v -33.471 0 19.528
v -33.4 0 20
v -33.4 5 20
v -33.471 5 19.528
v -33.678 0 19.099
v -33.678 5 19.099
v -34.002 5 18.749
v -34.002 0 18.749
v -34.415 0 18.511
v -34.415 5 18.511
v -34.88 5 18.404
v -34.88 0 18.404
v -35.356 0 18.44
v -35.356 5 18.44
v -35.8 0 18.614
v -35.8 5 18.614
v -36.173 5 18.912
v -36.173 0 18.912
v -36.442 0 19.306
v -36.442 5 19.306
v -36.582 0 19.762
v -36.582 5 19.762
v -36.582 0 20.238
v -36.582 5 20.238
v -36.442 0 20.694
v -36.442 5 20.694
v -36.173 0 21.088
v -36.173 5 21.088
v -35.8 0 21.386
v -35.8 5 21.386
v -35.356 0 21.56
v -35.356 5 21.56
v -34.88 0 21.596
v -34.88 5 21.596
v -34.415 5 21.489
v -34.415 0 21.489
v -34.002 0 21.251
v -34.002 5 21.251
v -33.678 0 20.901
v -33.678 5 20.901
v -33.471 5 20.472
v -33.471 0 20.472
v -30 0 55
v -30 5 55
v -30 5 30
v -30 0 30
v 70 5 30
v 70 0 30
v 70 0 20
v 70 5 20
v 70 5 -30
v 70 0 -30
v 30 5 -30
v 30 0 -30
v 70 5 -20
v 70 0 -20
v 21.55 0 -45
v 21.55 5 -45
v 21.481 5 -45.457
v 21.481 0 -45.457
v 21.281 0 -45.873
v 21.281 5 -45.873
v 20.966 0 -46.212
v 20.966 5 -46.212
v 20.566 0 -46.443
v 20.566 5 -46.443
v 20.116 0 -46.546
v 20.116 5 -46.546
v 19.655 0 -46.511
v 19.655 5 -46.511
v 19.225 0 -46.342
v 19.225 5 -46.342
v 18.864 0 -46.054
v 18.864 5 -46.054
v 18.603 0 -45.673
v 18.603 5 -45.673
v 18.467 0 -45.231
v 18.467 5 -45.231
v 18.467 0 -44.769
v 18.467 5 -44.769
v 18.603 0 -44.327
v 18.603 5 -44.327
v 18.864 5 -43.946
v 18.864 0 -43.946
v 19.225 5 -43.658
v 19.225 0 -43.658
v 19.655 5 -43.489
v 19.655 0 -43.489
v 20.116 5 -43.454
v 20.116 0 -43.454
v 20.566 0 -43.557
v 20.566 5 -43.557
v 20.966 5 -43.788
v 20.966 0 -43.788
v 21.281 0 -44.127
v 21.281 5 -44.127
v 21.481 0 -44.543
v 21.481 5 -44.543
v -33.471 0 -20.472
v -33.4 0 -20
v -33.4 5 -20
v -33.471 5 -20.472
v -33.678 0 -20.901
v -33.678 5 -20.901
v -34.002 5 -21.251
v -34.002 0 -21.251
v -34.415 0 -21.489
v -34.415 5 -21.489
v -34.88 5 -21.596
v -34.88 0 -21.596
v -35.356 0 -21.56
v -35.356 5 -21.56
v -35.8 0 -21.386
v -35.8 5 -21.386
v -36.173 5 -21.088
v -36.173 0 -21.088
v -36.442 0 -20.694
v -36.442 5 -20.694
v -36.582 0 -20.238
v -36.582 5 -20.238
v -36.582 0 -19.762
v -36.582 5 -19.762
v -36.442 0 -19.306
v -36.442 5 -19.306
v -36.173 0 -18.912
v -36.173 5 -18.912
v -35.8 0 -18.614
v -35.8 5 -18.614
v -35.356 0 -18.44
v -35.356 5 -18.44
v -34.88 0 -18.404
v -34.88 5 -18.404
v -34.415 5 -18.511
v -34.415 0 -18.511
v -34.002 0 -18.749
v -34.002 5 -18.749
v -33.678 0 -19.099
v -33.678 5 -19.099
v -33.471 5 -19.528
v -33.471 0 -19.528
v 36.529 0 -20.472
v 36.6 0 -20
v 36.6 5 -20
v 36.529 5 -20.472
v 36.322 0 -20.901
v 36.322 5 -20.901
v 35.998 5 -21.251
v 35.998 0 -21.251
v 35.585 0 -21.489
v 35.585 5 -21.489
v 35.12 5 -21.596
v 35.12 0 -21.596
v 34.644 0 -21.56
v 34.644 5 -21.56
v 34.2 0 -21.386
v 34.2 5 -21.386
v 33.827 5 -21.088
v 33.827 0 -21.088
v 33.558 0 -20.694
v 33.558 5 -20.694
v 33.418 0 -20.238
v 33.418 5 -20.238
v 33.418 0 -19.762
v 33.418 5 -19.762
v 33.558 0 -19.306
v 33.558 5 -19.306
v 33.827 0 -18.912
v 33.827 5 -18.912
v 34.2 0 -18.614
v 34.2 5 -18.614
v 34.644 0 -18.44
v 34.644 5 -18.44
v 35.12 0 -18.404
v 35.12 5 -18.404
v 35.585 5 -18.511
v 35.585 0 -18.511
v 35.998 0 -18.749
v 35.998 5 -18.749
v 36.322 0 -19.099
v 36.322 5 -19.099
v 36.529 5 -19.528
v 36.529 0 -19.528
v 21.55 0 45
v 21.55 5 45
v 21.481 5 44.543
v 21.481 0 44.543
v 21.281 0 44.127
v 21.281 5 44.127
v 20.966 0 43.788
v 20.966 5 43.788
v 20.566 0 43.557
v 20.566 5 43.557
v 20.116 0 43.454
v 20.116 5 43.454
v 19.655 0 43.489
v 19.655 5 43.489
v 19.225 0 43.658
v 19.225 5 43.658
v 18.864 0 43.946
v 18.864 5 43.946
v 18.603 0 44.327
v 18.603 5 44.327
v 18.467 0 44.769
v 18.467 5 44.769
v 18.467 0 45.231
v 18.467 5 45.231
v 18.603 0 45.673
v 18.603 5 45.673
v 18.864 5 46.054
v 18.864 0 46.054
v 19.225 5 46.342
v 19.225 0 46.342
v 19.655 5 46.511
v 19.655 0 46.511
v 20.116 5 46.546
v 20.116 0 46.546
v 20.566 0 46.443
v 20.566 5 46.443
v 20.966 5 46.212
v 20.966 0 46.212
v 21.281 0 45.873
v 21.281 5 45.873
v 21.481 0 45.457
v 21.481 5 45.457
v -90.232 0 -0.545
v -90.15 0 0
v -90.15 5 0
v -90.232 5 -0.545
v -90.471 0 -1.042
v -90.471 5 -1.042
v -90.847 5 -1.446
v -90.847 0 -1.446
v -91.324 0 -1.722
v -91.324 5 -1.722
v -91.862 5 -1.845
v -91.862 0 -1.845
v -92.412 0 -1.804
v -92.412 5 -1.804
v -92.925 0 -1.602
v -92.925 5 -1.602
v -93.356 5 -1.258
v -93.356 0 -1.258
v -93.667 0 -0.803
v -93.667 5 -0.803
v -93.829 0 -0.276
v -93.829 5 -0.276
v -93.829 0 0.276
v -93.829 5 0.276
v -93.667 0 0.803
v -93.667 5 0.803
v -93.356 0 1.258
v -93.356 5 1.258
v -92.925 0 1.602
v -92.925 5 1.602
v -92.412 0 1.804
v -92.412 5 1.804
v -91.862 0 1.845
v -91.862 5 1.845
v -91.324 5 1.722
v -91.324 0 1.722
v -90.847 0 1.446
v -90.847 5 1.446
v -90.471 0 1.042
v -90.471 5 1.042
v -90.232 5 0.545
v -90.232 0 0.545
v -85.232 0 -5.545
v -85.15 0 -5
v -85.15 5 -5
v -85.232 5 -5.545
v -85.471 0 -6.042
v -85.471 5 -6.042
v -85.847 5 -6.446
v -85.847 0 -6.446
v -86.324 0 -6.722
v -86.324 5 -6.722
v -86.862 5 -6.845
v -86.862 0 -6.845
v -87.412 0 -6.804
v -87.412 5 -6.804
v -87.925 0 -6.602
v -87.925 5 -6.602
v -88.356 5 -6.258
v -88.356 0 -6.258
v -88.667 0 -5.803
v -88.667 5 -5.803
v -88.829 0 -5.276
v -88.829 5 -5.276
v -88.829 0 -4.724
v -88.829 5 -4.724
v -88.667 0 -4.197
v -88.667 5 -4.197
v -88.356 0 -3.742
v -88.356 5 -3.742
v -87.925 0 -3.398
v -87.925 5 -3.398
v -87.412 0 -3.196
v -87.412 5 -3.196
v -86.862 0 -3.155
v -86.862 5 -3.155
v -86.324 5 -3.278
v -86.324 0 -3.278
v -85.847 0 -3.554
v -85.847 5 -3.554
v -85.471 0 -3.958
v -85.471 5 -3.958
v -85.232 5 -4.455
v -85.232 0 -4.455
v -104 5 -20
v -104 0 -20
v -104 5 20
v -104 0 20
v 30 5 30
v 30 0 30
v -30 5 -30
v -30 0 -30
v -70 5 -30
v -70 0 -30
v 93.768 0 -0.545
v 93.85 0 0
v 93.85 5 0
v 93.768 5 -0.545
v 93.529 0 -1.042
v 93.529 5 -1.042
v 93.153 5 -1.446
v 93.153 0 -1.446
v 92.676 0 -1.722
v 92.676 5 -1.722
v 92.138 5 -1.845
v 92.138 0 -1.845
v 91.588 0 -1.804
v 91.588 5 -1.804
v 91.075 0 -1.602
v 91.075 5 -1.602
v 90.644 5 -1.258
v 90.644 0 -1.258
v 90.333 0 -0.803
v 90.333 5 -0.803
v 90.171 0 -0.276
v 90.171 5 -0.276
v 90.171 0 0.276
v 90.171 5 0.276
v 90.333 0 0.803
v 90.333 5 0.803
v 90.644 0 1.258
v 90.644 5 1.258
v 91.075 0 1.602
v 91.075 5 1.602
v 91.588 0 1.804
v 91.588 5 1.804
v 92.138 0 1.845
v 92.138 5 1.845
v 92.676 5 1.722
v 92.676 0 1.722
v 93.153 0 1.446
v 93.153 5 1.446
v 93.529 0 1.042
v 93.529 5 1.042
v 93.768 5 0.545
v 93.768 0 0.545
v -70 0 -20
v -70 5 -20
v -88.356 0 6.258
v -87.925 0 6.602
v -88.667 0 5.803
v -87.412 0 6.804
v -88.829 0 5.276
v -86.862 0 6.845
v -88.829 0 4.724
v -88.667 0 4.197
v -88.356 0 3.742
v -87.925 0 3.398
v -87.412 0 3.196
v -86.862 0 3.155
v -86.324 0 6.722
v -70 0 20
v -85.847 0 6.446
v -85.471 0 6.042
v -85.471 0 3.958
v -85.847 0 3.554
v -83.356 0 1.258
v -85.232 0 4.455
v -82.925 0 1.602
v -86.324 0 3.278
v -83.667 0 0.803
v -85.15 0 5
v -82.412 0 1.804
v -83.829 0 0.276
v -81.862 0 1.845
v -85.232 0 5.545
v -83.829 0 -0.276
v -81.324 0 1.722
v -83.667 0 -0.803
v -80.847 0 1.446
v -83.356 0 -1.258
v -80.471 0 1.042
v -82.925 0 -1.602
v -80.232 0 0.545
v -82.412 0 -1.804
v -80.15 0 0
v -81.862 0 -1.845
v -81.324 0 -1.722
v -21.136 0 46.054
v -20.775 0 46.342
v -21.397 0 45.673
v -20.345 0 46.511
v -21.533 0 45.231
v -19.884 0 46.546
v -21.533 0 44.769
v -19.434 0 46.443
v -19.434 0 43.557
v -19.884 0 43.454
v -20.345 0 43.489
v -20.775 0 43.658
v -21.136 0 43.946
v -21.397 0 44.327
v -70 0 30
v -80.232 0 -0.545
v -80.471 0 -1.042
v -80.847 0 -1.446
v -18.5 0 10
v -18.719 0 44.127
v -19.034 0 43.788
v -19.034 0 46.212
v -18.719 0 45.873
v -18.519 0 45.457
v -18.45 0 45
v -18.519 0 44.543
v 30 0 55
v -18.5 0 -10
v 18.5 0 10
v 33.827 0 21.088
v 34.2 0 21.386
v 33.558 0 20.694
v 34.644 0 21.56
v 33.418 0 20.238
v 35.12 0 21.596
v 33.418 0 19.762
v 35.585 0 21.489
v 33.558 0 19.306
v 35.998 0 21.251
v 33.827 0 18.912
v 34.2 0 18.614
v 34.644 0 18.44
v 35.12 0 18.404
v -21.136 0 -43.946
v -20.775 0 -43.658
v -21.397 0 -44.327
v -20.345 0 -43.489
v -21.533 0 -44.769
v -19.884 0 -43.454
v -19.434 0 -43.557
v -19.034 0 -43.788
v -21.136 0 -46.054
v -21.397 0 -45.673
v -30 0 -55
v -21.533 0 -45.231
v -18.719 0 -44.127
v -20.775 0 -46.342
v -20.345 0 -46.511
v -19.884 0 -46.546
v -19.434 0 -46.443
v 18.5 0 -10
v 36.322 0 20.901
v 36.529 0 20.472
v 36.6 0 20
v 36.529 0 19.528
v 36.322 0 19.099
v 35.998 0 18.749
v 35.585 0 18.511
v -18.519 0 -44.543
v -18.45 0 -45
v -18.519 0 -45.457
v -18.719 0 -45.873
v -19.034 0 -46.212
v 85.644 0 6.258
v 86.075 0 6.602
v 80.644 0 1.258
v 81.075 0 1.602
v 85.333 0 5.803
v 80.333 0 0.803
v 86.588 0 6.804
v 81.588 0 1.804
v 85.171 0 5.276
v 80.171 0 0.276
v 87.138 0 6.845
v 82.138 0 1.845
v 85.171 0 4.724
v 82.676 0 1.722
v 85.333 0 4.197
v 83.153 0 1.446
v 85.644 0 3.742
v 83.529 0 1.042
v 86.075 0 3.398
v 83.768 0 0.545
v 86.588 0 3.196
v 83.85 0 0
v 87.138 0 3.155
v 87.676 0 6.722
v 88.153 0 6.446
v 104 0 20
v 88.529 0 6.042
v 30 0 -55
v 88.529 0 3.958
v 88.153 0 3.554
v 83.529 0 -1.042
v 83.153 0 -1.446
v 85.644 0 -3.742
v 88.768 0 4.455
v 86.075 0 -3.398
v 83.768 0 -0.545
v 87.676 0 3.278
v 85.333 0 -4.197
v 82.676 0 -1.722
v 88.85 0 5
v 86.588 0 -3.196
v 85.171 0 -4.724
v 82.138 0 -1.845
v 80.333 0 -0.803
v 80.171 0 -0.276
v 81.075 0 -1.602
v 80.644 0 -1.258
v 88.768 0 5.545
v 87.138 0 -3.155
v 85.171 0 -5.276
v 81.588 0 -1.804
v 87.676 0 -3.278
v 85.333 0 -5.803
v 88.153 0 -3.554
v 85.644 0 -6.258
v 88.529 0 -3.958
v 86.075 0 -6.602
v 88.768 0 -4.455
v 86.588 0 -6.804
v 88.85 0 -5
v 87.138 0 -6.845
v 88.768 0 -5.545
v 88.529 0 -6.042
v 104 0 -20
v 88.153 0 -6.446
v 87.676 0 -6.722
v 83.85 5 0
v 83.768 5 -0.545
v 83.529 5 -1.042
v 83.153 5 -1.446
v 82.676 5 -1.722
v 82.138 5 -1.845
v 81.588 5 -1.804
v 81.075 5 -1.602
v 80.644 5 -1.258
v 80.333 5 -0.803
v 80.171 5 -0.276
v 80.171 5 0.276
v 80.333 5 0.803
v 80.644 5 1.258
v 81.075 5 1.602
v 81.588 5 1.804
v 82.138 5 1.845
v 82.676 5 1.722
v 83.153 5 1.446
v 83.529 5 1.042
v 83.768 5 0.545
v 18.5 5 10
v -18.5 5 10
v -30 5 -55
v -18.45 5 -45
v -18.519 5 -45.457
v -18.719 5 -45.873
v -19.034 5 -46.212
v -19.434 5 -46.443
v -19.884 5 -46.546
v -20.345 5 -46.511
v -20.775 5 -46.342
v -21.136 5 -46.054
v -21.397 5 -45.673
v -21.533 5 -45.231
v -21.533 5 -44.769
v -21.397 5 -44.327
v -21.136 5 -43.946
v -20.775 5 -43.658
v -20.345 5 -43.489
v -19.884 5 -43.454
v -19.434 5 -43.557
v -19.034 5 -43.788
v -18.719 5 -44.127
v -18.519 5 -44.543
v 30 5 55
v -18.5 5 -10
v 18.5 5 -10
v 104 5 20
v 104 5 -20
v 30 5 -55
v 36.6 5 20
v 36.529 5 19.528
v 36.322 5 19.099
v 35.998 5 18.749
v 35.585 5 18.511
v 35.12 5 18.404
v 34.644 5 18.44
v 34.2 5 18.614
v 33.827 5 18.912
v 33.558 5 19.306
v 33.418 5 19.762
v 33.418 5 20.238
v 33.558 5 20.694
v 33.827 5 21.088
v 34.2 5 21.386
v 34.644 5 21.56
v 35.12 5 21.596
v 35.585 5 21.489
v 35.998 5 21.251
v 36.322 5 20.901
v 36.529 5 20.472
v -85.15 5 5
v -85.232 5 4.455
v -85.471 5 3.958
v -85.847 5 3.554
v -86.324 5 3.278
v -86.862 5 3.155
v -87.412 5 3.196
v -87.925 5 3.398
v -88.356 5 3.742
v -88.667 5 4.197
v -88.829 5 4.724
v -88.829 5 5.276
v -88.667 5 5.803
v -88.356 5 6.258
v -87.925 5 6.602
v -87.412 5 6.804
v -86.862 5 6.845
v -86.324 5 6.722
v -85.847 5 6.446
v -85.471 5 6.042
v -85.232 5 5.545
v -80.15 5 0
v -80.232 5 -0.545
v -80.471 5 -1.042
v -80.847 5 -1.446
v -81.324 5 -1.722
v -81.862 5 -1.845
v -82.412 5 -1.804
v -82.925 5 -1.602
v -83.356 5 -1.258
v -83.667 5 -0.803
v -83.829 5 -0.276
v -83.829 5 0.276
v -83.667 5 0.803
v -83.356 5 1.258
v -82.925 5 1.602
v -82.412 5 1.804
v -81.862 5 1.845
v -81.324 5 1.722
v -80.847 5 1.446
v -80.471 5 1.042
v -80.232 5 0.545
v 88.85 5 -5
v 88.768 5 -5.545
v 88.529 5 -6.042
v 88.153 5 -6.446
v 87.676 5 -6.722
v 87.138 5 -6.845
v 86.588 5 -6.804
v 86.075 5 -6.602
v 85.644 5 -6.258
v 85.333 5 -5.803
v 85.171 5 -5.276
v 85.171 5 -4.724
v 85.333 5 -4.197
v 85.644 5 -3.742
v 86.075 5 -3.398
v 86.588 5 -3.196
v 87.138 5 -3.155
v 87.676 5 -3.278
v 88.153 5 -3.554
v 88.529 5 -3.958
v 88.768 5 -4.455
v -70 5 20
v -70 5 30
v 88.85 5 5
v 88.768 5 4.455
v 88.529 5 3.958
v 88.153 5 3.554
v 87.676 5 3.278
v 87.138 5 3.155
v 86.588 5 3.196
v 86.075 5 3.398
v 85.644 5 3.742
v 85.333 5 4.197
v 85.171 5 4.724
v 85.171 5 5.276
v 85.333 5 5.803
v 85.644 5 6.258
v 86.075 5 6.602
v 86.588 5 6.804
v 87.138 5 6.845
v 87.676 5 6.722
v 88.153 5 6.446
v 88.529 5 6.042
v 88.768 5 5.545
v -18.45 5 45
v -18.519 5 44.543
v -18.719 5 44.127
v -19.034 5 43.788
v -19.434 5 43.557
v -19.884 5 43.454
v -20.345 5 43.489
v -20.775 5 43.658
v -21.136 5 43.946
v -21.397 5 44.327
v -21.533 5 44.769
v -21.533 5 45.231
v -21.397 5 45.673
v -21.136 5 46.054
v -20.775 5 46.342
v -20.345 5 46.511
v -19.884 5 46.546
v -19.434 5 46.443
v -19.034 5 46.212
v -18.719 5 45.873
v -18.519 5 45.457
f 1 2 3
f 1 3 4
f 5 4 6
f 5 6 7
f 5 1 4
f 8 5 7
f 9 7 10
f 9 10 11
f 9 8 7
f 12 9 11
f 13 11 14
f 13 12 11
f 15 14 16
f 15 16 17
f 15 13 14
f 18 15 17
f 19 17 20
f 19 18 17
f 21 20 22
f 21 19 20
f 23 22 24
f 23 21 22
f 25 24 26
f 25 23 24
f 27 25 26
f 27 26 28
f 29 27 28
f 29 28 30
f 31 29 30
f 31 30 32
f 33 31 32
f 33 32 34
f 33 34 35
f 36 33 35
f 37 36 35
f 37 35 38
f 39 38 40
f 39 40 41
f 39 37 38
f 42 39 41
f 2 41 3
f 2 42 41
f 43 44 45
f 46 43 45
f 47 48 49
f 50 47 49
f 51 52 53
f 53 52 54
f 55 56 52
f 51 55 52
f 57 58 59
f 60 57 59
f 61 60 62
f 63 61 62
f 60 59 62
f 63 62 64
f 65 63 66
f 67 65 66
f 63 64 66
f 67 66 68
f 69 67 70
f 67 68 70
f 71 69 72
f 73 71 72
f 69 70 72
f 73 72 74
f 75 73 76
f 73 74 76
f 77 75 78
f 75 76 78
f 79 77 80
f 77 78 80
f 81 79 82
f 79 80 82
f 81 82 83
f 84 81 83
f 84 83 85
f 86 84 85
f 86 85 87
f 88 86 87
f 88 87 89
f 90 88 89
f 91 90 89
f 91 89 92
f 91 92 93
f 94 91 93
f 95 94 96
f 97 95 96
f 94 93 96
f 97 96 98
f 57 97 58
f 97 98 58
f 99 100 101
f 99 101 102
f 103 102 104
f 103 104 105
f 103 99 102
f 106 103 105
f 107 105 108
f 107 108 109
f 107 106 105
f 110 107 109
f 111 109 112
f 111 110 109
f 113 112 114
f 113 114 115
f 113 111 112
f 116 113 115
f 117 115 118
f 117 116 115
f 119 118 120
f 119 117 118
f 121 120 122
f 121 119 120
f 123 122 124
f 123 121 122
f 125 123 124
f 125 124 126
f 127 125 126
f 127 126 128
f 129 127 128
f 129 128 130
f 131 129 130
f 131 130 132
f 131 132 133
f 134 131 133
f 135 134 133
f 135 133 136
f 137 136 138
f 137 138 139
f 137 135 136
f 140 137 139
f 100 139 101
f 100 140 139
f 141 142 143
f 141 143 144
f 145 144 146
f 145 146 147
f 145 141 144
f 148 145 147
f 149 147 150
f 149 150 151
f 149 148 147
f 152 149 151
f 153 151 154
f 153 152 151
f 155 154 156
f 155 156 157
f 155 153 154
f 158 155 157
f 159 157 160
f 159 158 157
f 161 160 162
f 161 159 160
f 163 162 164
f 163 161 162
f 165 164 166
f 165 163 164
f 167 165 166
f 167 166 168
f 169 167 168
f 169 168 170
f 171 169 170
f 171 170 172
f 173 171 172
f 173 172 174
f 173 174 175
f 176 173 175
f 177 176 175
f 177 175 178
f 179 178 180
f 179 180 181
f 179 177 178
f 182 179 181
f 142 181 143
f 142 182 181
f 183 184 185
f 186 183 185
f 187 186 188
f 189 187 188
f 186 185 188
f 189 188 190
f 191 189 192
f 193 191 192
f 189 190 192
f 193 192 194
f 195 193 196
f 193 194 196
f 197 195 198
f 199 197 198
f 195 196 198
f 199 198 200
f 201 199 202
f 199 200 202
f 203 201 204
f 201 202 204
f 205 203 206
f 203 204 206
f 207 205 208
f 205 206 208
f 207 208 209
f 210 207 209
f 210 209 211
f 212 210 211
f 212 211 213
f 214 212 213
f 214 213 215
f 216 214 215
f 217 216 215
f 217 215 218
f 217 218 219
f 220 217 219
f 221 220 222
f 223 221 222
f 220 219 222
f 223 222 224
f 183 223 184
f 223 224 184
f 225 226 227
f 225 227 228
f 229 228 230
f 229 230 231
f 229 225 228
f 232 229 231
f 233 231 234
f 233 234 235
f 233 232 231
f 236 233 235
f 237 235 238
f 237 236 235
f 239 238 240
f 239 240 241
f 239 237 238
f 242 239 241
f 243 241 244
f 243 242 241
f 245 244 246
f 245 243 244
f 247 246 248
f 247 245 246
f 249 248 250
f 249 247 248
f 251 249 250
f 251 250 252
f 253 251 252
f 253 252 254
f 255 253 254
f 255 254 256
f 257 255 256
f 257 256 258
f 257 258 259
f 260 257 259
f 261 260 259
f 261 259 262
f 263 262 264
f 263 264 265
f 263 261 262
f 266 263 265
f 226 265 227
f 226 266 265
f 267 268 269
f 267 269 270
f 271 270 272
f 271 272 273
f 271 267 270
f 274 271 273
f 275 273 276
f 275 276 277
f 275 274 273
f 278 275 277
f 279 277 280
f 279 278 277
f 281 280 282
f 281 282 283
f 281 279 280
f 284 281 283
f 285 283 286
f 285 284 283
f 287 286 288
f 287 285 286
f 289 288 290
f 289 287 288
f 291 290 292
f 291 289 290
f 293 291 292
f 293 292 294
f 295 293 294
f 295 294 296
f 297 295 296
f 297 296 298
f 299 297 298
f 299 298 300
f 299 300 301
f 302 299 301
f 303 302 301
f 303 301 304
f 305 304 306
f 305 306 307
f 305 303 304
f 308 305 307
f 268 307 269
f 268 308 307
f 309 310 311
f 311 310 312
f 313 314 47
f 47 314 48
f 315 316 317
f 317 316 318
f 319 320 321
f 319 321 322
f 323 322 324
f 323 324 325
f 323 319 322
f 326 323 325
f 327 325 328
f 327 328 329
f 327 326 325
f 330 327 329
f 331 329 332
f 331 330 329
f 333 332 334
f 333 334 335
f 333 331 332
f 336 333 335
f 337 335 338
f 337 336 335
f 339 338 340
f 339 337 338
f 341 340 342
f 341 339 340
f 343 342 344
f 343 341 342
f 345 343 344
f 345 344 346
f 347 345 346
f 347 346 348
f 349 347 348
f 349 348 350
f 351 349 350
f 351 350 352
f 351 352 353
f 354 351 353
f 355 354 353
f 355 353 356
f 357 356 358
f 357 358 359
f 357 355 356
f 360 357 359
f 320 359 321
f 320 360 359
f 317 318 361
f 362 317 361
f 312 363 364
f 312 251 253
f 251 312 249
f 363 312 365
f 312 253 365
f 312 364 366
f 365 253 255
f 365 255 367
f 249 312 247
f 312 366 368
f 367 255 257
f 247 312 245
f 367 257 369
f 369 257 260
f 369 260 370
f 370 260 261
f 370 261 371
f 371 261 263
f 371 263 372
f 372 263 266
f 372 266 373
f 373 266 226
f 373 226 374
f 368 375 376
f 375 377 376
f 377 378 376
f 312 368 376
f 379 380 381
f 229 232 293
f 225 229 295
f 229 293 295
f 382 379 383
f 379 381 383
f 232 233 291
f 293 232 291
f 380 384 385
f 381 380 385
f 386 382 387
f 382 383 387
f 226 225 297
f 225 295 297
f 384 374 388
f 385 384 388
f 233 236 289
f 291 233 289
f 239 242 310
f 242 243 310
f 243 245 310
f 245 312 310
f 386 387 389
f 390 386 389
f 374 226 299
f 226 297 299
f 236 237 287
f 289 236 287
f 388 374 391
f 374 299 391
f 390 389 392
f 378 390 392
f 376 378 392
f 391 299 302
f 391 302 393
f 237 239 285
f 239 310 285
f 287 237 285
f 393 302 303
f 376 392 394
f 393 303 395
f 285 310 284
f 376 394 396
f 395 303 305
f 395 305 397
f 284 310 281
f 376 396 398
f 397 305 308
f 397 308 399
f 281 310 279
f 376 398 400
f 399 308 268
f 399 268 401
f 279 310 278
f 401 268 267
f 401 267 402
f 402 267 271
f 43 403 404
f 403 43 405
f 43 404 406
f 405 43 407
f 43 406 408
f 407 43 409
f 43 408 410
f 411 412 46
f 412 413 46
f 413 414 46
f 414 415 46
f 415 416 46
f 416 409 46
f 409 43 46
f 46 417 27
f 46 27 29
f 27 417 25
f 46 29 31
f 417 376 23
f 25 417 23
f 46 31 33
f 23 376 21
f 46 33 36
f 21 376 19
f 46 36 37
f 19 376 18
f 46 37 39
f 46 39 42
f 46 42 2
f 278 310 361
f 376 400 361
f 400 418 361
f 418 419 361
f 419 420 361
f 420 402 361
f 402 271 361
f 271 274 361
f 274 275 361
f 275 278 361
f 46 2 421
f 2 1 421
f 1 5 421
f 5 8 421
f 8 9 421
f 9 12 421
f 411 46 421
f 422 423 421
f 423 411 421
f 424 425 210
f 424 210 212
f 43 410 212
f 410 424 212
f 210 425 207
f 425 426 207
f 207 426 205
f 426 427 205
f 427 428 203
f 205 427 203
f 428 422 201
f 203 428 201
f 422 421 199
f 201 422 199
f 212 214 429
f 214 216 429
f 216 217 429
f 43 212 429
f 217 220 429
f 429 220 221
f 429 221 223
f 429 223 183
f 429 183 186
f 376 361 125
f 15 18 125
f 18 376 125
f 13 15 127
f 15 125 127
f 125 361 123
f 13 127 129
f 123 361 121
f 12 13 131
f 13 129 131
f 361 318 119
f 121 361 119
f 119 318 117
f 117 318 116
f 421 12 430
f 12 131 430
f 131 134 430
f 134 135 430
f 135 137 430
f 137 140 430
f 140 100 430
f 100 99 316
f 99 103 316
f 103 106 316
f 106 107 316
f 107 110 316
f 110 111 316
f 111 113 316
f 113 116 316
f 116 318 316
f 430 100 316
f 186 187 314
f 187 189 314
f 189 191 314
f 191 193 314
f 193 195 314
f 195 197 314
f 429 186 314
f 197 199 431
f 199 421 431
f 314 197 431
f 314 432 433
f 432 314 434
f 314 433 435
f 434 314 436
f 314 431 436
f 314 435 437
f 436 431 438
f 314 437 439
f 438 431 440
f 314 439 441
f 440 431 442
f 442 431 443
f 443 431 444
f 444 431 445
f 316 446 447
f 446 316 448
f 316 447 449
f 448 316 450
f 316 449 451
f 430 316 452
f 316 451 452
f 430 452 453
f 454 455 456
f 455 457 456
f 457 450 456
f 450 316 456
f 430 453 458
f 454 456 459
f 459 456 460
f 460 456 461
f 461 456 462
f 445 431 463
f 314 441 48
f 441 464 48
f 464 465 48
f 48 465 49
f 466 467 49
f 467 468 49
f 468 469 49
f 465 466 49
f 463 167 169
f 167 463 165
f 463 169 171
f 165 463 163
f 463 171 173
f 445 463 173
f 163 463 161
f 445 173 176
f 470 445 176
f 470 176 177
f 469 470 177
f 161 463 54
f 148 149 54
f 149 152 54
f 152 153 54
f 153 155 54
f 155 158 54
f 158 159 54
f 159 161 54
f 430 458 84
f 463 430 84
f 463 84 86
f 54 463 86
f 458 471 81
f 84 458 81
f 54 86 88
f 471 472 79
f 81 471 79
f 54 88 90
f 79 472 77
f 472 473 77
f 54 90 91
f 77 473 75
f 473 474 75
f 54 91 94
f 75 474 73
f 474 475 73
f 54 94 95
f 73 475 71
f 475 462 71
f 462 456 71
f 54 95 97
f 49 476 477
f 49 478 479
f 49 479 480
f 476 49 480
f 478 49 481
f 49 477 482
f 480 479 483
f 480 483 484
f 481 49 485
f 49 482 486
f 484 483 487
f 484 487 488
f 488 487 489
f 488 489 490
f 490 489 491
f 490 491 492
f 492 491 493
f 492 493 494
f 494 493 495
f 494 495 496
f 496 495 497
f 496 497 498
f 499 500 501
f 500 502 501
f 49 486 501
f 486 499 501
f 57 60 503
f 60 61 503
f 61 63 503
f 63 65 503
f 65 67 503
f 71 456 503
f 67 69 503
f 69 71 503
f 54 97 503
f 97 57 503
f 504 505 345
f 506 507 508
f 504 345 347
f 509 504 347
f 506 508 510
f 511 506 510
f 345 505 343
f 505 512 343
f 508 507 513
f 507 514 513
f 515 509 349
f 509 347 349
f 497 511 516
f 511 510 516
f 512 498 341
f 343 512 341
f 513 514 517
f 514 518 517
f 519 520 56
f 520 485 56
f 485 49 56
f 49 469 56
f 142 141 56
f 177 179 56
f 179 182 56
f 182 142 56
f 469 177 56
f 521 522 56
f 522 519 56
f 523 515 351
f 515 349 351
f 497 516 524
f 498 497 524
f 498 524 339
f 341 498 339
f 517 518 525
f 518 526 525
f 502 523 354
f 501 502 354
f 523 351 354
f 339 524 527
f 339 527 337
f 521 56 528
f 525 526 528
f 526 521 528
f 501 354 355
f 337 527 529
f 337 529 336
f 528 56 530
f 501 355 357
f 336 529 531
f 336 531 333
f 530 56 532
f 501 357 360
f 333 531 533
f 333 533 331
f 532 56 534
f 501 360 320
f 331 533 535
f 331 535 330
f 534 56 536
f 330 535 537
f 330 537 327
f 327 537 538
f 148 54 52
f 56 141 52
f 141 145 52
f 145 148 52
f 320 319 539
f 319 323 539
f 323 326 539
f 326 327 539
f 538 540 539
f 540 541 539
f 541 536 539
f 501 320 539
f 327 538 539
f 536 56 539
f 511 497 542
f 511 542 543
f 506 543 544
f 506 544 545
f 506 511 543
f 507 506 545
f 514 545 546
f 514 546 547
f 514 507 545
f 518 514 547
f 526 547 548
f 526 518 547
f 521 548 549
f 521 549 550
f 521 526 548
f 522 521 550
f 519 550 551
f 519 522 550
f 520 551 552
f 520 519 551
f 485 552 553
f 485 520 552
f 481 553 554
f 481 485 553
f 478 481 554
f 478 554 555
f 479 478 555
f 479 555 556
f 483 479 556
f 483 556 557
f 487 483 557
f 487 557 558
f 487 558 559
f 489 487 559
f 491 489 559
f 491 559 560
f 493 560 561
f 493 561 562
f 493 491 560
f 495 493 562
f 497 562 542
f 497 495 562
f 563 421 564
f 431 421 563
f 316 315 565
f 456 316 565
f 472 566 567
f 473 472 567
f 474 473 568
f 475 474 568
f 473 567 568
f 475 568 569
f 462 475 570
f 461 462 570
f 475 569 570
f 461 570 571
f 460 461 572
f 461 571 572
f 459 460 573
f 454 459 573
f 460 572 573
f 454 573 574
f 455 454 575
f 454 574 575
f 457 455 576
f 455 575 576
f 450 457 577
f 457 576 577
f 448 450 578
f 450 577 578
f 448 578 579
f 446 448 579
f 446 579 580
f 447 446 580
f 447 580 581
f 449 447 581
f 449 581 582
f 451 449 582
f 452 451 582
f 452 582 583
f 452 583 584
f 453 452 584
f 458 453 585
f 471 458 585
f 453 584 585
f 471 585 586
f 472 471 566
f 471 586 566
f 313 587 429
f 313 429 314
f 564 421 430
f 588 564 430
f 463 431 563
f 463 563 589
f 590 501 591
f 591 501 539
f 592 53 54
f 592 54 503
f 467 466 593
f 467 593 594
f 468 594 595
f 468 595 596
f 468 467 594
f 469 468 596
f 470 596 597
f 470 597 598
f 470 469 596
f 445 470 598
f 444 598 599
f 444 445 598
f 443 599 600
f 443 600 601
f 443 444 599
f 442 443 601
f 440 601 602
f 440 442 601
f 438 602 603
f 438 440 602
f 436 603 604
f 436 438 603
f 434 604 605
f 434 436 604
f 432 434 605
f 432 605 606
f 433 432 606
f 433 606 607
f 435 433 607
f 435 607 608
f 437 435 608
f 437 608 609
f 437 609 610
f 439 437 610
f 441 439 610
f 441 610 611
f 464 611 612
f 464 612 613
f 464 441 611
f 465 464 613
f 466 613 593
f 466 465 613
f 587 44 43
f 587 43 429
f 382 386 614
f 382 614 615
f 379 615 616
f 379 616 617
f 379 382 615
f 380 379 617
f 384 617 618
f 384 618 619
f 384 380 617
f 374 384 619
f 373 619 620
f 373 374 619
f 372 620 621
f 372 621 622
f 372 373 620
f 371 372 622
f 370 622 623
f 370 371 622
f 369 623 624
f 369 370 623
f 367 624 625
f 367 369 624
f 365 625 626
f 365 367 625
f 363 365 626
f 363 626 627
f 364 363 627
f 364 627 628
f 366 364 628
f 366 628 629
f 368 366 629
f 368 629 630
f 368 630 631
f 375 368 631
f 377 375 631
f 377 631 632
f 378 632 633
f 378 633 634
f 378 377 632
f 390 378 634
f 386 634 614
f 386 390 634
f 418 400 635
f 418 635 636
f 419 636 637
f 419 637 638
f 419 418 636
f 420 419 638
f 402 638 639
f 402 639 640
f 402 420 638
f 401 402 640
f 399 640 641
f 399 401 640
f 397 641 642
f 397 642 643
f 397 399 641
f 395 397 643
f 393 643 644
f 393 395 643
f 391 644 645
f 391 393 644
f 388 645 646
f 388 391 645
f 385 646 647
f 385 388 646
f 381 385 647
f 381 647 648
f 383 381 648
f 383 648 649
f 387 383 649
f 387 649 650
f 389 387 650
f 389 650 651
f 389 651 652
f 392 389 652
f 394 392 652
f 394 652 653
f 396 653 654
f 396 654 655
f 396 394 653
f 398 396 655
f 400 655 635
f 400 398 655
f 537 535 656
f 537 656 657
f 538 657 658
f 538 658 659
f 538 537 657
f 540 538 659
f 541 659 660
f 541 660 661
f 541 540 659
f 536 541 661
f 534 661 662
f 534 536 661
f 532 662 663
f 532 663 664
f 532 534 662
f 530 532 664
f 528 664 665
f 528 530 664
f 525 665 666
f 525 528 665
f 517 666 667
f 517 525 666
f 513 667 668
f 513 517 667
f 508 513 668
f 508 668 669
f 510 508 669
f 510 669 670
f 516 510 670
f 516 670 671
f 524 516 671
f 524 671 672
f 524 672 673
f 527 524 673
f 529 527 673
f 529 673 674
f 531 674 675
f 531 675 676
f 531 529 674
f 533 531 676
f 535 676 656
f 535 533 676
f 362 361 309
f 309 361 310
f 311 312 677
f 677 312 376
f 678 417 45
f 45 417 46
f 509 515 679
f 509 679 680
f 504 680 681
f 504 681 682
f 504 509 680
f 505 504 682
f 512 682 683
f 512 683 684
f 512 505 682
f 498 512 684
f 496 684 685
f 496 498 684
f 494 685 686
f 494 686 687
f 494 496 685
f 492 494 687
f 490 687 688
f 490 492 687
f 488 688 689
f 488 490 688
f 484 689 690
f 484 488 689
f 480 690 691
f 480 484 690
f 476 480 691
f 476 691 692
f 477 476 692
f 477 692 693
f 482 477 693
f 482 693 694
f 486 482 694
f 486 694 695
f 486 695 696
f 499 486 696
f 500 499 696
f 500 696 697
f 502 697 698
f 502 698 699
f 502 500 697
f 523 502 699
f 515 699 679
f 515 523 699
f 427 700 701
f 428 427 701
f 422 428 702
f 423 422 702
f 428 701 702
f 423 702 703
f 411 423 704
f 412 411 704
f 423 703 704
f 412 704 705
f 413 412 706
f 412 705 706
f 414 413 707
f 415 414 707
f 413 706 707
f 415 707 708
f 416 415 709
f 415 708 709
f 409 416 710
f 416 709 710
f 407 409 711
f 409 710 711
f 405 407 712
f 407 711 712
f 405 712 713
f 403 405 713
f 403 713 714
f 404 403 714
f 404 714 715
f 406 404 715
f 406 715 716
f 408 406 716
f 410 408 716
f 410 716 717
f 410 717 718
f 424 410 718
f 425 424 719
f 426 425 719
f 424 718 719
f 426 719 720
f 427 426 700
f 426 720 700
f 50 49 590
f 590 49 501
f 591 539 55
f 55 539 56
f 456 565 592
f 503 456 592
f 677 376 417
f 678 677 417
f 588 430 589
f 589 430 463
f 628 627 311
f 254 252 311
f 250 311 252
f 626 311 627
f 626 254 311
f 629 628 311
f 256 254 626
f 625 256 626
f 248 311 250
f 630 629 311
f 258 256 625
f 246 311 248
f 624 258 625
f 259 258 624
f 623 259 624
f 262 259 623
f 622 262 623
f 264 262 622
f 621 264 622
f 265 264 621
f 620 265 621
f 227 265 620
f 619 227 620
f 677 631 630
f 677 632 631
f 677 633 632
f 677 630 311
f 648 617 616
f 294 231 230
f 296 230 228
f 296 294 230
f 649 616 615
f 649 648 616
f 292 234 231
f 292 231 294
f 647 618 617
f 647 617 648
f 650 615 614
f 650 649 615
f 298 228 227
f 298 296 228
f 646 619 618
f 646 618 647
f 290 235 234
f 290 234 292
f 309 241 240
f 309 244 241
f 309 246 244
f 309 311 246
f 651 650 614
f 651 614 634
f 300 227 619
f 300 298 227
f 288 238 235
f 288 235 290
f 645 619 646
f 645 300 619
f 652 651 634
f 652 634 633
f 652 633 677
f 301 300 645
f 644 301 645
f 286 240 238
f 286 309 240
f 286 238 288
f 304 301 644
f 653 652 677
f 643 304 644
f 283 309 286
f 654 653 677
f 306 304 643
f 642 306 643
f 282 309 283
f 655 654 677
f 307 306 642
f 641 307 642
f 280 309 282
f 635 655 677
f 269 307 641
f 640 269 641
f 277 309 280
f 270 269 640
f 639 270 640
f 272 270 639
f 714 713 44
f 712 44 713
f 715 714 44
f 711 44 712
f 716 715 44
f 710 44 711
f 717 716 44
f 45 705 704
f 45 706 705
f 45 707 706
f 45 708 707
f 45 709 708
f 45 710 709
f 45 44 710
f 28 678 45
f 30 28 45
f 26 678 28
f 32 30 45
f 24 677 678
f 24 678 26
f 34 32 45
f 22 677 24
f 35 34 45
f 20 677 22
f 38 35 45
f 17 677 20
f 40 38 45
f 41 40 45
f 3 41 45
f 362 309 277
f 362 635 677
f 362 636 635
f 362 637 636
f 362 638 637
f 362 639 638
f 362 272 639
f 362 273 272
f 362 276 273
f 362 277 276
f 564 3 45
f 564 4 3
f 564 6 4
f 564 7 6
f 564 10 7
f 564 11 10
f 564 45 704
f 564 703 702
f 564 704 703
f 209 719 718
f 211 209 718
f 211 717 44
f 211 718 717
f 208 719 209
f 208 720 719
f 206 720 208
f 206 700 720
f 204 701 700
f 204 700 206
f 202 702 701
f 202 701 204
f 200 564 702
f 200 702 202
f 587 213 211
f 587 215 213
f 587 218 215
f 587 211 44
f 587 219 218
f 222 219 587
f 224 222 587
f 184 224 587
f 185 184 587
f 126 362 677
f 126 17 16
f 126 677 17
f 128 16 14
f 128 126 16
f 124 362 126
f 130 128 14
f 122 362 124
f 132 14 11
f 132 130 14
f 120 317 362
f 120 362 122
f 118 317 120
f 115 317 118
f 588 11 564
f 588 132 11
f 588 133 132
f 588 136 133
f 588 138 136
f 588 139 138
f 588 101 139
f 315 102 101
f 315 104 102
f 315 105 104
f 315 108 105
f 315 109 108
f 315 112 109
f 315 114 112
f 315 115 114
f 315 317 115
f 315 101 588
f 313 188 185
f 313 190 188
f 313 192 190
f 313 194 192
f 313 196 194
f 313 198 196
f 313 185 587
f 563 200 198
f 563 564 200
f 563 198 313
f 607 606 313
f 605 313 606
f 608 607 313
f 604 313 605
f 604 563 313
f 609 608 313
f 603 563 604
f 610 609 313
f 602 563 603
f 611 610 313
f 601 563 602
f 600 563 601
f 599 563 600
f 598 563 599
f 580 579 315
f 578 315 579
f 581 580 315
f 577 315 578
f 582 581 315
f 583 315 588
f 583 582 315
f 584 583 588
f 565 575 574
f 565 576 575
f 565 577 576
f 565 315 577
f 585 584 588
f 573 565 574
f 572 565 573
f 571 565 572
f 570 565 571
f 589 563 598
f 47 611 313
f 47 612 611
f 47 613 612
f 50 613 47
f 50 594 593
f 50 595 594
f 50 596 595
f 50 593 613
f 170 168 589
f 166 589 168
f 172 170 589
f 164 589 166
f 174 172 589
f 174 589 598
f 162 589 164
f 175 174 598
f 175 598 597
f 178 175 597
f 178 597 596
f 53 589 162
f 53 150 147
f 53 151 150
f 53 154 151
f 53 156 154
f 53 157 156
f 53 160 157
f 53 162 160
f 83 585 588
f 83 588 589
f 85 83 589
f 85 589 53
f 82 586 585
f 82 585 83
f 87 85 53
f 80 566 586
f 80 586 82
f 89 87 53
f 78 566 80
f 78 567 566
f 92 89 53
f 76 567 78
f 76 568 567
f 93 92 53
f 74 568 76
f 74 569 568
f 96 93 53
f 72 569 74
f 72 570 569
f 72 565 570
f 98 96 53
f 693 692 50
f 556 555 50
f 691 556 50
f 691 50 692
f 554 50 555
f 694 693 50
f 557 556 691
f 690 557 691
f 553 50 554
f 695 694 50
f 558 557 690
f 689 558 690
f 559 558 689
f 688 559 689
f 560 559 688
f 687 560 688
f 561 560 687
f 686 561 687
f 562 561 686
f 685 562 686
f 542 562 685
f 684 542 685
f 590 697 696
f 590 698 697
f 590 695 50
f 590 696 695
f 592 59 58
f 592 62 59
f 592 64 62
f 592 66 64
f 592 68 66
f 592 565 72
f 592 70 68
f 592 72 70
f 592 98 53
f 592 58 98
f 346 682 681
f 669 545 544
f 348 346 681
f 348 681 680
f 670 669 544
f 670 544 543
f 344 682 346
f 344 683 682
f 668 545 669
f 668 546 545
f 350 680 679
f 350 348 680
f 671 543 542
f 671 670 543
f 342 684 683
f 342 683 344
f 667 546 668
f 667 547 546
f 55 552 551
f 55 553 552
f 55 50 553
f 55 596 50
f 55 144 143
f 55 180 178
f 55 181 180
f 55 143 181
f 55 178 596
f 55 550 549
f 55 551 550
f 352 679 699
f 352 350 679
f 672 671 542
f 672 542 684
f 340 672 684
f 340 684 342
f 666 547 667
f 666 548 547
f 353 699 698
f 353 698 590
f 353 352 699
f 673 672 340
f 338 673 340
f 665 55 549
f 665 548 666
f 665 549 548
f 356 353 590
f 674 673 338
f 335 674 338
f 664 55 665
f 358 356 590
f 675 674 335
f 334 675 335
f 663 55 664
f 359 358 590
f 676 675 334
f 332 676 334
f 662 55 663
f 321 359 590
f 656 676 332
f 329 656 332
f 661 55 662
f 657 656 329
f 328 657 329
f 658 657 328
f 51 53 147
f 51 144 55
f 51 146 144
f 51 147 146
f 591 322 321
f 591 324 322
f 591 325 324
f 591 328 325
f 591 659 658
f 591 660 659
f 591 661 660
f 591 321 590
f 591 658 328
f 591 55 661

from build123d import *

# Parameters (mm, degrees)
SKETCH1_W           = 37
SKETCH1_H           = 20
SKETCH1_R           = 1.6
SKETCH1_R_2         = 1.85
BOSS_EXTRUDE1_DEPTH = 5
SKETCH2_W           = 60
SKETCH2_H           = 25
SKETCH2_R           = 1.55
BOSS_EXTRUDE2_DEPTH = 5


with BuildPart() as part:
    # Sketch1 → Boss-Extrude1 (new body)
    with BuildSketch(Plane(origin=(0, 0, 0), x_dir=(1, 0, 0), z_dir=(0, 1, 0))):
        Polygon((-70, 30), (-70, 20), (-104, 20), (-104, -20), (-70, -20), (-70, -30), (70, -30), (70, -20), (104, -20), (104, 20), (70, 20), (70, 30), align=None)
        Rectangle(SKETCH1_W, SKETCH1_H, mode=Mode.SUBTRACT)
        with Locations((-35, -20)):
            Circle(SKETCH1_R, mode=Mode.SUBTRACT)
        with Locations((-35, 20)):
            Circle(SKETCH1_R, mode=Mode.SUBTRACT)
        with Locations((35, -20)):
            Circle(SKETCH1_R, mode=Mode.SUBTRACT)
        with Locations((35, 20)):
            Circle(SKETCH1_R, mode=Mode.SUBTRACT)
        with Locations((-87, 5)):
            Circle(SKETCH1_R_2, mode=Mode.SUBTRACT)
        with Locations((-87, -5)):
            Circle(SKETCH1_R_2, mode=Mode.SUBTRACT)
        with Locations((-92, 0)):
            Circle(SKETCH1_R_2, mode=Mode.SUBTRACT)
        with Locations((-82, 0)):
            Circle(SKETCH1_R_2, mode=Mode.SUBTRACT)
        with Locations((87, 5)):
            Circle(SKETCH1_R_2, mode=Mode.SUBTRACT)
        with Locations((87, -5)):
            Circle(SKETCH1_R_2, mode=Mode.SUBTRACT)
        with Locations((82, 0)):
            Circle(SKETCH1_R_2, mode=Mode.SUBTRACT)
        with Locations((92, 0)):
            Circle(SKETCH1_R_2, mode=Mode.SUBTRACT)
    extrude(amount=BOSS_EXTRUDE1_DEPTH)

    # Sketch2 → Boss-Extrude2 (add)
    with BuildSketch(Plane(origin=(0, 5, 0), x_dir=(1, 0, 0), z_dir=(0, 1, 0))):
        with Locations((0, 42.5)):
            Rectangle(SKETCH2_W, SKETCH2_H)
        with Locations((20, 45)):
            Circle(SKETCH2_R, mode=Mode.SUBTRACT)
        with Locations((-20, 45)):
            Circle(SKETCH2_R, mode=Mode.SUBTRACT)
        with Locations((0, -42.5)):
            Rectangle(SKETCH2_W, SKETCH2_H)
        with Locations((20, -45)):
            Circle(SKETCH2_R, mode=Mode.SUBTRACT)
        with Locations((-20, -45)):
            Circle(SKETCH2_R, mode=Mode.SUBTRACT)
    extrude(amount=-BOSS_EXTRUDE2_DEPTH)


solid = part.part
